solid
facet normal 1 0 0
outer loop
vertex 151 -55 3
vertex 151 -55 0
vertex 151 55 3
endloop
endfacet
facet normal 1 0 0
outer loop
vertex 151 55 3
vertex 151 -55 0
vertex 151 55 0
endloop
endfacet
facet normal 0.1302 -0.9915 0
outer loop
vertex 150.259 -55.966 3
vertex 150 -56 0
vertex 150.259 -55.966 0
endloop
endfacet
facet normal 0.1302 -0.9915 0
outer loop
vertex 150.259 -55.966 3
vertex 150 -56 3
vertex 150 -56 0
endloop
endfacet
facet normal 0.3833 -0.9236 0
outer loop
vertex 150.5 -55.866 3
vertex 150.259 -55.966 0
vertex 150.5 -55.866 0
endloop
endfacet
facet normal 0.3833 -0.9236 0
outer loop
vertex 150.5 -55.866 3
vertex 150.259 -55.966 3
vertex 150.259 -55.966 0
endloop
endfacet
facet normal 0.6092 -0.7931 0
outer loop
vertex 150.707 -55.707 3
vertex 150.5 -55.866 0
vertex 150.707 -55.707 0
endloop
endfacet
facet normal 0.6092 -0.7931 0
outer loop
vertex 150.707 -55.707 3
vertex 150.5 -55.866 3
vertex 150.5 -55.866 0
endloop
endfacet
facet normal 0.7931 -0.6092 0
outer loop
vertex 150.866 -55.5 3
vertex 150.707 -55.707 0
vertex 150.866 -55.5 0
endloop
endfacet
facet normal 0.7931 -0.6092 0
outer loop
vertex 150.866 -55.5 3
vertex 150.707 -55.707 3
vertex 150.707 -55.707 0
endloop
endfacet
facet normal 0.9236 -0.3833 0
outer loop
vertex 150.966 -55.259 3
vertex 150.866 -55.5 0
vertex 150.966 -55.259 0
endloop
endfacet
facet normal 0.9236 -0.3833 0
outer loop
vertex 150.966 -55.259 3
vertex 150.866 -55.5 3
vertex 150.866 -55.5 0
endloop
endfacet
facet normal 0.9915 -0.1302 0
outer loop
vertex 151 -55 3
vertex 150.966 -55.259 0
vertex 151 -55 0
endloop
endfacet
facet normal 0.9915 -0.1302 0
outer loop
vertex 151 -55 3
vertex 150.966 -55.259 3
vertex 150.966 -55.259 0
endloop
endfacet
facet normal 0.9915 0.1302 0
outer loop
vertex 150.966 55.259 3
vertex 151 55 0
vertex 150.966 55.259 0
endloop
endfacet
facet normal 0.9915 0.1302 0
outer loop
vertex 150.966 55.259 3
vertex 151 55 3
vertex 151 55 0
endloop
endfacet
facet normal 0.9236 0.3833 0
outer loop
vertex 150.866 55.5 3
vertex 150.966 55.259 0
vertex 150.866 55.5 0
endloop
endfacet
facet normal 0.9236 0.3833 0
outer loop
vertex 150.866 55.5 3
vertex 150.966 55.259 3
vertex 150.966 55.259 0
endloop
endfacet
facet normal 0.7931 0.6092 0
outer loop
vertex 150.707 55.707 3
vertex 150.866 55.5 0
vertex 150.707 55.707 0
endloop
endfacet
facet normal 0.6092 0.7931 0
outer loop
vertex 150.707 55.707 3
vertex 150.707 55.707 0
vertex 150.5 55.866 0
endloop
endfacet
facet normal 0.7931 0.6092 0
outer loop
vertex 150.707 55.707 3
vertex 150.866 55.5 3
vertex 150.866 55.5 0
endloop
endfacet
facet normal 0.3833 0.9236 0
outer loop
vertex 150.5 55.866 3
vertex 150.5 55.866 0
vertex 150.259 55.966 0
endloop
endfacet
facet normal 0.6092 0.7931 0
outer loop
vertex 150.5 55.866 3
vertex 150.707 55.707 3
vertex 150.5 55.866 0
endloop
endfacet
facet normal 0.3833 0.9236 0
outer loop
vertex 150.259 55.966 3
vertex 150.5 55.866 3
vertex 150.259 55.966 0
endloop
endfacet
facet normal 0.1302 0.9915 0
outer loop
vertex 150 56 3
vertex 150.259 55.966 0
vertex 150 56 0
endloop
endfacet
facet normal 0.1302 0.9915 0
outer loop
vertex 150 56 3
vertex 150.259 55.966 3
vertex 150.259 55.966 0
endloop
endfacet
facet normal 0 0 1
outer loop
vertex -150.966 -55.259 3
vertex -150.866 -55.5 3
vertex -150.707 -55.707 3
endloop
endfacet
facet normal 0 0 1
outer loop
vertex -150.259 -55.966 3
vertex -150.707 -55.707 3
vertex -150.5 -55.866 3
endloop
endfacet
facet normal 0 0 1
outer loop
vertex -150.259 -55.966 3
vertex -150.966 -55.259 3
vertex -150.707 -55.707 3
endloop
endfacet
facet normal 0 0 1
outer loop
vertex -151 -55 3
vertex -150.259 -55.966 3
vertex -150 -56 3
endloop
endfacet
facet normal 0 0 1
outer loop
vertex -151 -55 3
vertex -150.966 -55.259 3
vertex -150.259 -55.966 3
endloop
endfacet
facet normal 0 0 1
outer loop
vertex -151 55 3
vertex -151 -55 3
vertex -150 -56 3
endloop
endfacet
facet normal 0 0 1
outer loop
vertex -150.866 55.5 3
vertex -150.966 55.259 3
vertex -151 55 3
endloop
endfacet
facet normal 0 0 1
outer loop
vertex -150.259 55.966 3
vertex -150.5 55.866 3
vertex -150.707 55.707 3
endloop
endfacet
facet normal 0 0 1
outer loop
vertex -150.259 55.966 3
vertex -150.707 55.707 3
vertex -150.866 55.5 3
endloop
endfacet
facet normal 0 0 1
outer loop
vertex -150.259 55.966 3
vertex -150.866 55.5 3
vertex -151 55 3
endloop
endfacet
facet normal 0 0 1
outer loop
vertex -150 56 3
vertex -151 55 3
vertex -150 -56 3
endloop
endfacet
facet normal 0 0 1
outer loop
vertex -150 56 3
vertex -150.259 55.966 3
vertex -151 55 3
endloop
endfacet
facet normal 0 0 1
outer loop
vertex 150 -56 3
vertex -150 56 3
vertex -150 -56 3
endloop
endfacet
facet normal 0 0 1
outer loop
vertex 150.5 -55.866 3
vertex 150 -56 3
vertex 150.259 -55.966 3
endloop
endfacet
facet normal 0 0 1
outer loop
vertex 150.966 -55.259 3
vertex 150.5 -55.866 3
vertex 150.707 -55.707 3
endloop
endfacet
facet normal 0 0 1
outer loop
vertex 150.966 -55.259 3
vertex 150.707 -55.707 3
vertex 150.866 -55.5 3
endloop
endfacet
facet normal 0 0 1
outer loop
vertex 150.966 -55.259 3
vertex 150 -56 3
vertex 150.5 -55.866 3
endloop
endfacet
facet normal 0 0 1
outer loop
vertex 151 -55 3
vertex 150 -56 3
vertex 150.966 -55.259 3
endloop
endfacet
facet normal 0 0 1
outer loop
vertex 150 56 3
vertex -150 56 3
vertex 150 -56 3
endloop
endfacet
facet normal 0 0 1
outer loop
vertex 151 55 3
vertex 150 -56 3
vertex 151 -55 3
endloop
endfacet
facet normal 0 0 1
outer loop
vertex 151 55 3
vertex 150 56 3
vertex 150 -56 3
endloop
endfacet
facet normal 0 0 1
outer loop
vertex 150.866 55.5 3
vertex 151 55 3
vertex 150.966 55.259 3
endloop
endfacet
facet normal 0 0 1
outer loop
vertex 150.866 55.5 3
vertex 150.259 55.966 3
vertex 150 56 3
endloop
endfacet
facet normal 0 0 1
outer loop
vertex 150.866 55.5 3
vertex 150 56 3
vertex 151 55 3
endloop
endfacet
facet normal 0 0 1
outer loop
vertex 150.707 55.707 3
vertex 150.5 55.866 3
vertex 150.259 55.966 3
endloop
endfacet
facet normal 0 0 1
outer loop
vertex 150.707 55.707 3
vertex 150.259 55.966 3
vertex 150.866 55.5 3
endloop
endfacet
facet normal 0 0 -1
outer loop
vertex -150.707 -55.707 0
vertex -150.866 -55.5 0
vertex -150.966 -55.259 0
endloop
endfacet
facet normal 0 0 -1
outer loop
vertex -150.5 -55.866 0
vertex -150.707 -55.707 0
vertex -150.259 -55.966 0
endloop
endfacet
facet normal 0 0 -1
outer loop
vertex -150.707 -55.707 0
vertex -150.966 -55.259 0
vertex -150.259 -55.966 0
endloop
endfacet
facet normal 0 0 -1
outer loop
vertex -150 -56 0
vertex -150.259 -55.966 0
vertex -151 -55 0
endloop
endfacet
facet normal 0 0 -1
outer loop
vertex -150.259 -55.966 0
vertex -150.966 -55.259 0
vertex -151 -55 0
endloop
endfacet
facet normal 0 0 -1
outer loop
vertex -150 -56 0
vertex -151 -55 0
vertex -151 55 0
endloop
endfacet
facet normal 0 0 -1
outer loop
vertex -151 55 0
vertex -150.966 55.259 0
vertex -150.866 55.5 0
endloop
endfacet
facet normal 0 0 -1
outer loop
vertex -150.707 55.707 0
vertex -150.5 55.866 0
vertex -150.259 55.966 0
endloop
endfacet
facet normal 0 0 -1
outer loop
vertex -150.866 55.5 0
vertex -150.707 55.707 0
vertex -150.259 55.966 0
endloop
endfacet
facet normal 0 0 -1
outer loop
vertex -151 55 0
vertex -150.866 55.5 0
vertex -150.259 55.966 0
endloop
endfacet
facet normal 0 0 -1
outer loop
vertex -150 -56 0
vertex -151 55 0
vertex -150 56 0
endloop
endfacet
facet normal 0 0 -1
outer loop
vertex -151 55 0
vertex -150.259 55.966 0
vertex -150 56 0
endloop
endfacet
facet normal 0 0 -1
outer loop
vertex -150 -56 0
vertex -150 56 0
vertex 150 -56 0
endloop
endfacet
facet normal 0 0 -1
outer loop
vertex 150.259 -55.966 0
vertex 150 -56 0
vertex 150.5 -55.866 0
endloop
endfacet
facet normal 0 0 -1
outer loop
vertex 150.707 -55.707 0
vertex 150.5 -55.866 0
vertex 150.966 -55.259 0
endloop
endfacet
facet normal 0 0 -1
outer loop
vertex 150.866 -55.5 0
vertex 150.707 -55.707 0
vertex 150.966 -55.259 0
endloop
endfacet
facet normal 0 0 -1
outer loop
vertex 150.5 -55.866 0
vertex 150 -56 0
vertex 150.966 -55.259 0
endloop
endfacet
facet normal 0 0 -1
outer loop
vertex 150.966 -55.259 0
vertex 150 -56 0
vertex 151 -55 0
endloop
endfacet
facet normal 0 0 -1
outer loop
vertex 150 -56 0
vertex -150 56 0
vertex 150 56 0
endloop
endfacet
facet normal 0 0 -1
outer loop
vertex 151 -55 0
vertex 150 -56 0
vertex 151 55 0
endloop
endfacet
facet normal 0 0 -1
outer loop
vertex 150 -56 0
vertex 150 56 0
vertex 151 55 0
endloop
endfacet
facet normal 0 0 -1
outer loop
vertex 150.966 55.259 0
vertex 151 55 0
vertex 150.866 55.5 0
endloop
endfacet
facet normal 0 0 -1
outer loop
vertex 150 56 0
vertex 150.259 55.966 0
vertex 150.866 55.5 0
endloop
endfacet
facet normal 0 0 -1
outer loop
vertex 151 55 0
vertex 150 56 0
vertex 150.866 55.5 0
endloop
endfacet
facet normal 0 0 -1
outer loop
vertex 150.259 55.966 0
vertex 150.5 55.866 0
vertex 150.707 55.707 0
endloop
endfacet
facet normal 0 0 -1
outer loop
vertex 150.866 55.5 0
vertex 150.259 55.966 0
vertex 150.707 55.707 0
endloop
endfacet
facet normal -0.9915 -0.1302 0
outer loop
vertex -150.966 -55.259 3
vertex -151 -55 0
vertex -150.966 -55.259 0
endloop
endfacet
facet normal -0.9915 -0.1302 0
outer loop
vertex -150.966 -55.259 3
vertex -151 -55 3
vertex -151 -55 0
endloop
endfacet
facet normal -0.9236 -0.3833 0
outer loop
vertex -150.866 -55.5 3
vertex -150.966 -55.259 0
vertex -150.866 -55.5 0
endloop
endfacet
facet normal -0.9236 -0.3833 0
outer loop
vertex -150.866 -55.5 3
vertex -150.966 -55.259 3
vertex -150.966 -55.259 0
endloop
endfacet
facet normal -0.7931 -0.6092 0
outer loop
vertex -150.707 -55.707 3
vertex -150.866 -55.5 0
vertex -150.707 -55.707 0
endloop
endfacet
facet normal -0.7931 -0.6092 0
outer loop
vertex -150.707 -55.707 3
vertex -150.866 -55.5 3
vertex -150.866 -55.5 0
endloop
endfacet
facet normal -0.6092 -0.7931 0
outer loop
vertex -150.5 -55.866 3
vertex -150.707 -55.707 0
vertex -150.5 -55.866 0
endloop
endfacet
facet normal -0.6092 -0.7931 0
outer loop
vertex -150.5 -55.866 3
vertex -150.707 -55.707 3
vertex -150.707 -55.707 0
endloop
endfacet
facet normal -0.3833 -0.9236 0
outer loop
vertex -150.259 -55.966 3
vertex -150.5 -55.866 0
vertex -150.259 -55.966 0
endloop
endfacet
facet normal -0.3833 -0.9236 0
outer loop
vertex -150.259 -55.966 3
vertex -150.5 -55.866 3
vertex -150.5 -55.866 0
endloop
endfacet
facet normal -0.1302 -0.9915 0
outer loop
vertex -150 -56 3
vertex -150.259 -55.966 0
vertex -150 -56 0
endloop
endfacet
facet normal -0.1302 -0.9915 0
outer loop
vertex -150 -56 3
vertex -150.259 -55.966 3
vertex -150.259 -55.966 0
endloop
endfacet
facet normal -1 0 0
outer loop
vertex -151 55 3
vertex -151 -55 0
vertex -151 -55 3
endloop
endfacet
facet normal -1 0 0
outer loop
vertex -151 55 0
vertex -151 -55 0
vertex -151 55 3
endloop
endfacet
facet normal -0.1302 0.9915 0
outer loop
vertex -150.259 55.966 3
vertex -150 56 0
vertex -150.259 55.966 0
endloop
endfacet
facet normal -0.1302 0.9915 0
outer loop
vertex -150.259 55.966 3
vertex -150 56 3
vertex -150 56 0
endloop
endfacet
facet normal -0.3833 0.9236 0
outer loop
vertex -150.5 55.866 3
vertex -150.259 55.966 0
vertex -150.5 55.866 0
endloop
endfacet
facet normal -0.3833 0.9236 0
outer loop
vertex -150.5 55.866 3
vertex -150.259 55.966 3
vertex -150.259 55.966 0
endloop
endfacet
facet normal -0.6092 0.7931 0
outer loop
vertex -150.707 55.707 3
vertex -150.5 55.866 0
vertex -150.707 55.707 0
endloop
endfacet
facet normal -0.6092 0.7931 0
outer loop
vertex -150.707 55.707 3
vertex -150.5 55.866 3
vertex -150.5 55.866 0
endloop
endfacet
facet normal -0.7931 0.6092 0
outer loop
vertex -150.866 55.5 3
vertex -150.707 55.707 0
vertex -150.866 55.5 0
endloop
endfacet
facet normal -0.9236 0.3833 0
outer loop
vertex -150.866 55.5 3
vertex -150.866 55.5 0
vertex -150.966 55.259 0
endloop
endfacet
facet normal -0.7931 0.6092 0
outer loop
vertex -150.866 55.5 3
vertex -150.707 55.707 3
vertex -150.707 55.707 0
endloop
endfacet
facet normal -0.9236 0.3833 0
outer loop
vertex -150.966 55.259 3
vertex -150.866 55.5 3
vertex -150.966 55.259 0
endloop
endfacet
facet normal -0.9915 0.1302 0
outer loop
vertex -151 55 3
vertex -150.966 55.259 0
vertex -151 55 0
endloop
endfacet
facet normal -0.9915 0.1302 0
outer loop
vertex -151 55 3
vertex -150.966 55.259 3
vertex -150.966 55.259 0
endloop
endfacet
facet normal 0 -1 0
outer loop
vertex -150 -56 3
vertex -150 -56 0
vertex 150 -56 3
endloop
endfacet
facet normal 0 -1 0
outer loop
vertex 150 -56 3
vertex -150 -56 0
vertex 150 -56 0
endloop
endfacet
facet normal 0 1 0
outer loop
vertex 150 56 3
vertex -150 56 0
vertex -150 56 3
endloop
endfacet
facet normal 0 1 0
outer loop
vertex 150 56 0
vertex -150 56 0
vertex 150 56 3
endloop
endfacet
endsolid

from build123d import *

# Parameters (mm, degrees)
SKETCH_W    = 302
SKETCH_H    = 112
PAD_DEPTH   = 3
FILLET_R    = 1
FILLET001_R = 1
FILLET002_R = 1
FILLET003_R = 1


with BuildPart() as part:
    # Sketch → Pad (new body)
    with BuildSketch(Plane.XY):
        Rectangle(SKETCH_W, SKETCH_H)
    extrude(amount=PAD_DEPTH)

    # Fillet
    fillet_edges = [part.edges().sort_by_distance(p)[0] for p in [
        (-151, -56, 1.5),
    ]]
    fillet(fillet_edges, radius=FILLET_R)

    # Fillet001
    fillet001_edges = [part.edges().sort_by_distance(p)[0] for p in [
        (151, -56, 1.5),
    ]]
    fillet(fillet001_edges, radius=FILLET001_R)

    # Fillet002
    fillet002_edges = [part.edges().sort_by_distance(p)[0] for p in [
        (151, 56, 1.5),
    ]]
    fillet(fillet002_edges, radius=FILLET002_R)

    # Fillet003
    fillet003_edges = [part.edges().sort_by_distance(p)[0] for p in [
        (-151, 56, 1.5),
    ]]
    fillet(fillet003_edges, radius=FILLET003_R)


solid = part.part
